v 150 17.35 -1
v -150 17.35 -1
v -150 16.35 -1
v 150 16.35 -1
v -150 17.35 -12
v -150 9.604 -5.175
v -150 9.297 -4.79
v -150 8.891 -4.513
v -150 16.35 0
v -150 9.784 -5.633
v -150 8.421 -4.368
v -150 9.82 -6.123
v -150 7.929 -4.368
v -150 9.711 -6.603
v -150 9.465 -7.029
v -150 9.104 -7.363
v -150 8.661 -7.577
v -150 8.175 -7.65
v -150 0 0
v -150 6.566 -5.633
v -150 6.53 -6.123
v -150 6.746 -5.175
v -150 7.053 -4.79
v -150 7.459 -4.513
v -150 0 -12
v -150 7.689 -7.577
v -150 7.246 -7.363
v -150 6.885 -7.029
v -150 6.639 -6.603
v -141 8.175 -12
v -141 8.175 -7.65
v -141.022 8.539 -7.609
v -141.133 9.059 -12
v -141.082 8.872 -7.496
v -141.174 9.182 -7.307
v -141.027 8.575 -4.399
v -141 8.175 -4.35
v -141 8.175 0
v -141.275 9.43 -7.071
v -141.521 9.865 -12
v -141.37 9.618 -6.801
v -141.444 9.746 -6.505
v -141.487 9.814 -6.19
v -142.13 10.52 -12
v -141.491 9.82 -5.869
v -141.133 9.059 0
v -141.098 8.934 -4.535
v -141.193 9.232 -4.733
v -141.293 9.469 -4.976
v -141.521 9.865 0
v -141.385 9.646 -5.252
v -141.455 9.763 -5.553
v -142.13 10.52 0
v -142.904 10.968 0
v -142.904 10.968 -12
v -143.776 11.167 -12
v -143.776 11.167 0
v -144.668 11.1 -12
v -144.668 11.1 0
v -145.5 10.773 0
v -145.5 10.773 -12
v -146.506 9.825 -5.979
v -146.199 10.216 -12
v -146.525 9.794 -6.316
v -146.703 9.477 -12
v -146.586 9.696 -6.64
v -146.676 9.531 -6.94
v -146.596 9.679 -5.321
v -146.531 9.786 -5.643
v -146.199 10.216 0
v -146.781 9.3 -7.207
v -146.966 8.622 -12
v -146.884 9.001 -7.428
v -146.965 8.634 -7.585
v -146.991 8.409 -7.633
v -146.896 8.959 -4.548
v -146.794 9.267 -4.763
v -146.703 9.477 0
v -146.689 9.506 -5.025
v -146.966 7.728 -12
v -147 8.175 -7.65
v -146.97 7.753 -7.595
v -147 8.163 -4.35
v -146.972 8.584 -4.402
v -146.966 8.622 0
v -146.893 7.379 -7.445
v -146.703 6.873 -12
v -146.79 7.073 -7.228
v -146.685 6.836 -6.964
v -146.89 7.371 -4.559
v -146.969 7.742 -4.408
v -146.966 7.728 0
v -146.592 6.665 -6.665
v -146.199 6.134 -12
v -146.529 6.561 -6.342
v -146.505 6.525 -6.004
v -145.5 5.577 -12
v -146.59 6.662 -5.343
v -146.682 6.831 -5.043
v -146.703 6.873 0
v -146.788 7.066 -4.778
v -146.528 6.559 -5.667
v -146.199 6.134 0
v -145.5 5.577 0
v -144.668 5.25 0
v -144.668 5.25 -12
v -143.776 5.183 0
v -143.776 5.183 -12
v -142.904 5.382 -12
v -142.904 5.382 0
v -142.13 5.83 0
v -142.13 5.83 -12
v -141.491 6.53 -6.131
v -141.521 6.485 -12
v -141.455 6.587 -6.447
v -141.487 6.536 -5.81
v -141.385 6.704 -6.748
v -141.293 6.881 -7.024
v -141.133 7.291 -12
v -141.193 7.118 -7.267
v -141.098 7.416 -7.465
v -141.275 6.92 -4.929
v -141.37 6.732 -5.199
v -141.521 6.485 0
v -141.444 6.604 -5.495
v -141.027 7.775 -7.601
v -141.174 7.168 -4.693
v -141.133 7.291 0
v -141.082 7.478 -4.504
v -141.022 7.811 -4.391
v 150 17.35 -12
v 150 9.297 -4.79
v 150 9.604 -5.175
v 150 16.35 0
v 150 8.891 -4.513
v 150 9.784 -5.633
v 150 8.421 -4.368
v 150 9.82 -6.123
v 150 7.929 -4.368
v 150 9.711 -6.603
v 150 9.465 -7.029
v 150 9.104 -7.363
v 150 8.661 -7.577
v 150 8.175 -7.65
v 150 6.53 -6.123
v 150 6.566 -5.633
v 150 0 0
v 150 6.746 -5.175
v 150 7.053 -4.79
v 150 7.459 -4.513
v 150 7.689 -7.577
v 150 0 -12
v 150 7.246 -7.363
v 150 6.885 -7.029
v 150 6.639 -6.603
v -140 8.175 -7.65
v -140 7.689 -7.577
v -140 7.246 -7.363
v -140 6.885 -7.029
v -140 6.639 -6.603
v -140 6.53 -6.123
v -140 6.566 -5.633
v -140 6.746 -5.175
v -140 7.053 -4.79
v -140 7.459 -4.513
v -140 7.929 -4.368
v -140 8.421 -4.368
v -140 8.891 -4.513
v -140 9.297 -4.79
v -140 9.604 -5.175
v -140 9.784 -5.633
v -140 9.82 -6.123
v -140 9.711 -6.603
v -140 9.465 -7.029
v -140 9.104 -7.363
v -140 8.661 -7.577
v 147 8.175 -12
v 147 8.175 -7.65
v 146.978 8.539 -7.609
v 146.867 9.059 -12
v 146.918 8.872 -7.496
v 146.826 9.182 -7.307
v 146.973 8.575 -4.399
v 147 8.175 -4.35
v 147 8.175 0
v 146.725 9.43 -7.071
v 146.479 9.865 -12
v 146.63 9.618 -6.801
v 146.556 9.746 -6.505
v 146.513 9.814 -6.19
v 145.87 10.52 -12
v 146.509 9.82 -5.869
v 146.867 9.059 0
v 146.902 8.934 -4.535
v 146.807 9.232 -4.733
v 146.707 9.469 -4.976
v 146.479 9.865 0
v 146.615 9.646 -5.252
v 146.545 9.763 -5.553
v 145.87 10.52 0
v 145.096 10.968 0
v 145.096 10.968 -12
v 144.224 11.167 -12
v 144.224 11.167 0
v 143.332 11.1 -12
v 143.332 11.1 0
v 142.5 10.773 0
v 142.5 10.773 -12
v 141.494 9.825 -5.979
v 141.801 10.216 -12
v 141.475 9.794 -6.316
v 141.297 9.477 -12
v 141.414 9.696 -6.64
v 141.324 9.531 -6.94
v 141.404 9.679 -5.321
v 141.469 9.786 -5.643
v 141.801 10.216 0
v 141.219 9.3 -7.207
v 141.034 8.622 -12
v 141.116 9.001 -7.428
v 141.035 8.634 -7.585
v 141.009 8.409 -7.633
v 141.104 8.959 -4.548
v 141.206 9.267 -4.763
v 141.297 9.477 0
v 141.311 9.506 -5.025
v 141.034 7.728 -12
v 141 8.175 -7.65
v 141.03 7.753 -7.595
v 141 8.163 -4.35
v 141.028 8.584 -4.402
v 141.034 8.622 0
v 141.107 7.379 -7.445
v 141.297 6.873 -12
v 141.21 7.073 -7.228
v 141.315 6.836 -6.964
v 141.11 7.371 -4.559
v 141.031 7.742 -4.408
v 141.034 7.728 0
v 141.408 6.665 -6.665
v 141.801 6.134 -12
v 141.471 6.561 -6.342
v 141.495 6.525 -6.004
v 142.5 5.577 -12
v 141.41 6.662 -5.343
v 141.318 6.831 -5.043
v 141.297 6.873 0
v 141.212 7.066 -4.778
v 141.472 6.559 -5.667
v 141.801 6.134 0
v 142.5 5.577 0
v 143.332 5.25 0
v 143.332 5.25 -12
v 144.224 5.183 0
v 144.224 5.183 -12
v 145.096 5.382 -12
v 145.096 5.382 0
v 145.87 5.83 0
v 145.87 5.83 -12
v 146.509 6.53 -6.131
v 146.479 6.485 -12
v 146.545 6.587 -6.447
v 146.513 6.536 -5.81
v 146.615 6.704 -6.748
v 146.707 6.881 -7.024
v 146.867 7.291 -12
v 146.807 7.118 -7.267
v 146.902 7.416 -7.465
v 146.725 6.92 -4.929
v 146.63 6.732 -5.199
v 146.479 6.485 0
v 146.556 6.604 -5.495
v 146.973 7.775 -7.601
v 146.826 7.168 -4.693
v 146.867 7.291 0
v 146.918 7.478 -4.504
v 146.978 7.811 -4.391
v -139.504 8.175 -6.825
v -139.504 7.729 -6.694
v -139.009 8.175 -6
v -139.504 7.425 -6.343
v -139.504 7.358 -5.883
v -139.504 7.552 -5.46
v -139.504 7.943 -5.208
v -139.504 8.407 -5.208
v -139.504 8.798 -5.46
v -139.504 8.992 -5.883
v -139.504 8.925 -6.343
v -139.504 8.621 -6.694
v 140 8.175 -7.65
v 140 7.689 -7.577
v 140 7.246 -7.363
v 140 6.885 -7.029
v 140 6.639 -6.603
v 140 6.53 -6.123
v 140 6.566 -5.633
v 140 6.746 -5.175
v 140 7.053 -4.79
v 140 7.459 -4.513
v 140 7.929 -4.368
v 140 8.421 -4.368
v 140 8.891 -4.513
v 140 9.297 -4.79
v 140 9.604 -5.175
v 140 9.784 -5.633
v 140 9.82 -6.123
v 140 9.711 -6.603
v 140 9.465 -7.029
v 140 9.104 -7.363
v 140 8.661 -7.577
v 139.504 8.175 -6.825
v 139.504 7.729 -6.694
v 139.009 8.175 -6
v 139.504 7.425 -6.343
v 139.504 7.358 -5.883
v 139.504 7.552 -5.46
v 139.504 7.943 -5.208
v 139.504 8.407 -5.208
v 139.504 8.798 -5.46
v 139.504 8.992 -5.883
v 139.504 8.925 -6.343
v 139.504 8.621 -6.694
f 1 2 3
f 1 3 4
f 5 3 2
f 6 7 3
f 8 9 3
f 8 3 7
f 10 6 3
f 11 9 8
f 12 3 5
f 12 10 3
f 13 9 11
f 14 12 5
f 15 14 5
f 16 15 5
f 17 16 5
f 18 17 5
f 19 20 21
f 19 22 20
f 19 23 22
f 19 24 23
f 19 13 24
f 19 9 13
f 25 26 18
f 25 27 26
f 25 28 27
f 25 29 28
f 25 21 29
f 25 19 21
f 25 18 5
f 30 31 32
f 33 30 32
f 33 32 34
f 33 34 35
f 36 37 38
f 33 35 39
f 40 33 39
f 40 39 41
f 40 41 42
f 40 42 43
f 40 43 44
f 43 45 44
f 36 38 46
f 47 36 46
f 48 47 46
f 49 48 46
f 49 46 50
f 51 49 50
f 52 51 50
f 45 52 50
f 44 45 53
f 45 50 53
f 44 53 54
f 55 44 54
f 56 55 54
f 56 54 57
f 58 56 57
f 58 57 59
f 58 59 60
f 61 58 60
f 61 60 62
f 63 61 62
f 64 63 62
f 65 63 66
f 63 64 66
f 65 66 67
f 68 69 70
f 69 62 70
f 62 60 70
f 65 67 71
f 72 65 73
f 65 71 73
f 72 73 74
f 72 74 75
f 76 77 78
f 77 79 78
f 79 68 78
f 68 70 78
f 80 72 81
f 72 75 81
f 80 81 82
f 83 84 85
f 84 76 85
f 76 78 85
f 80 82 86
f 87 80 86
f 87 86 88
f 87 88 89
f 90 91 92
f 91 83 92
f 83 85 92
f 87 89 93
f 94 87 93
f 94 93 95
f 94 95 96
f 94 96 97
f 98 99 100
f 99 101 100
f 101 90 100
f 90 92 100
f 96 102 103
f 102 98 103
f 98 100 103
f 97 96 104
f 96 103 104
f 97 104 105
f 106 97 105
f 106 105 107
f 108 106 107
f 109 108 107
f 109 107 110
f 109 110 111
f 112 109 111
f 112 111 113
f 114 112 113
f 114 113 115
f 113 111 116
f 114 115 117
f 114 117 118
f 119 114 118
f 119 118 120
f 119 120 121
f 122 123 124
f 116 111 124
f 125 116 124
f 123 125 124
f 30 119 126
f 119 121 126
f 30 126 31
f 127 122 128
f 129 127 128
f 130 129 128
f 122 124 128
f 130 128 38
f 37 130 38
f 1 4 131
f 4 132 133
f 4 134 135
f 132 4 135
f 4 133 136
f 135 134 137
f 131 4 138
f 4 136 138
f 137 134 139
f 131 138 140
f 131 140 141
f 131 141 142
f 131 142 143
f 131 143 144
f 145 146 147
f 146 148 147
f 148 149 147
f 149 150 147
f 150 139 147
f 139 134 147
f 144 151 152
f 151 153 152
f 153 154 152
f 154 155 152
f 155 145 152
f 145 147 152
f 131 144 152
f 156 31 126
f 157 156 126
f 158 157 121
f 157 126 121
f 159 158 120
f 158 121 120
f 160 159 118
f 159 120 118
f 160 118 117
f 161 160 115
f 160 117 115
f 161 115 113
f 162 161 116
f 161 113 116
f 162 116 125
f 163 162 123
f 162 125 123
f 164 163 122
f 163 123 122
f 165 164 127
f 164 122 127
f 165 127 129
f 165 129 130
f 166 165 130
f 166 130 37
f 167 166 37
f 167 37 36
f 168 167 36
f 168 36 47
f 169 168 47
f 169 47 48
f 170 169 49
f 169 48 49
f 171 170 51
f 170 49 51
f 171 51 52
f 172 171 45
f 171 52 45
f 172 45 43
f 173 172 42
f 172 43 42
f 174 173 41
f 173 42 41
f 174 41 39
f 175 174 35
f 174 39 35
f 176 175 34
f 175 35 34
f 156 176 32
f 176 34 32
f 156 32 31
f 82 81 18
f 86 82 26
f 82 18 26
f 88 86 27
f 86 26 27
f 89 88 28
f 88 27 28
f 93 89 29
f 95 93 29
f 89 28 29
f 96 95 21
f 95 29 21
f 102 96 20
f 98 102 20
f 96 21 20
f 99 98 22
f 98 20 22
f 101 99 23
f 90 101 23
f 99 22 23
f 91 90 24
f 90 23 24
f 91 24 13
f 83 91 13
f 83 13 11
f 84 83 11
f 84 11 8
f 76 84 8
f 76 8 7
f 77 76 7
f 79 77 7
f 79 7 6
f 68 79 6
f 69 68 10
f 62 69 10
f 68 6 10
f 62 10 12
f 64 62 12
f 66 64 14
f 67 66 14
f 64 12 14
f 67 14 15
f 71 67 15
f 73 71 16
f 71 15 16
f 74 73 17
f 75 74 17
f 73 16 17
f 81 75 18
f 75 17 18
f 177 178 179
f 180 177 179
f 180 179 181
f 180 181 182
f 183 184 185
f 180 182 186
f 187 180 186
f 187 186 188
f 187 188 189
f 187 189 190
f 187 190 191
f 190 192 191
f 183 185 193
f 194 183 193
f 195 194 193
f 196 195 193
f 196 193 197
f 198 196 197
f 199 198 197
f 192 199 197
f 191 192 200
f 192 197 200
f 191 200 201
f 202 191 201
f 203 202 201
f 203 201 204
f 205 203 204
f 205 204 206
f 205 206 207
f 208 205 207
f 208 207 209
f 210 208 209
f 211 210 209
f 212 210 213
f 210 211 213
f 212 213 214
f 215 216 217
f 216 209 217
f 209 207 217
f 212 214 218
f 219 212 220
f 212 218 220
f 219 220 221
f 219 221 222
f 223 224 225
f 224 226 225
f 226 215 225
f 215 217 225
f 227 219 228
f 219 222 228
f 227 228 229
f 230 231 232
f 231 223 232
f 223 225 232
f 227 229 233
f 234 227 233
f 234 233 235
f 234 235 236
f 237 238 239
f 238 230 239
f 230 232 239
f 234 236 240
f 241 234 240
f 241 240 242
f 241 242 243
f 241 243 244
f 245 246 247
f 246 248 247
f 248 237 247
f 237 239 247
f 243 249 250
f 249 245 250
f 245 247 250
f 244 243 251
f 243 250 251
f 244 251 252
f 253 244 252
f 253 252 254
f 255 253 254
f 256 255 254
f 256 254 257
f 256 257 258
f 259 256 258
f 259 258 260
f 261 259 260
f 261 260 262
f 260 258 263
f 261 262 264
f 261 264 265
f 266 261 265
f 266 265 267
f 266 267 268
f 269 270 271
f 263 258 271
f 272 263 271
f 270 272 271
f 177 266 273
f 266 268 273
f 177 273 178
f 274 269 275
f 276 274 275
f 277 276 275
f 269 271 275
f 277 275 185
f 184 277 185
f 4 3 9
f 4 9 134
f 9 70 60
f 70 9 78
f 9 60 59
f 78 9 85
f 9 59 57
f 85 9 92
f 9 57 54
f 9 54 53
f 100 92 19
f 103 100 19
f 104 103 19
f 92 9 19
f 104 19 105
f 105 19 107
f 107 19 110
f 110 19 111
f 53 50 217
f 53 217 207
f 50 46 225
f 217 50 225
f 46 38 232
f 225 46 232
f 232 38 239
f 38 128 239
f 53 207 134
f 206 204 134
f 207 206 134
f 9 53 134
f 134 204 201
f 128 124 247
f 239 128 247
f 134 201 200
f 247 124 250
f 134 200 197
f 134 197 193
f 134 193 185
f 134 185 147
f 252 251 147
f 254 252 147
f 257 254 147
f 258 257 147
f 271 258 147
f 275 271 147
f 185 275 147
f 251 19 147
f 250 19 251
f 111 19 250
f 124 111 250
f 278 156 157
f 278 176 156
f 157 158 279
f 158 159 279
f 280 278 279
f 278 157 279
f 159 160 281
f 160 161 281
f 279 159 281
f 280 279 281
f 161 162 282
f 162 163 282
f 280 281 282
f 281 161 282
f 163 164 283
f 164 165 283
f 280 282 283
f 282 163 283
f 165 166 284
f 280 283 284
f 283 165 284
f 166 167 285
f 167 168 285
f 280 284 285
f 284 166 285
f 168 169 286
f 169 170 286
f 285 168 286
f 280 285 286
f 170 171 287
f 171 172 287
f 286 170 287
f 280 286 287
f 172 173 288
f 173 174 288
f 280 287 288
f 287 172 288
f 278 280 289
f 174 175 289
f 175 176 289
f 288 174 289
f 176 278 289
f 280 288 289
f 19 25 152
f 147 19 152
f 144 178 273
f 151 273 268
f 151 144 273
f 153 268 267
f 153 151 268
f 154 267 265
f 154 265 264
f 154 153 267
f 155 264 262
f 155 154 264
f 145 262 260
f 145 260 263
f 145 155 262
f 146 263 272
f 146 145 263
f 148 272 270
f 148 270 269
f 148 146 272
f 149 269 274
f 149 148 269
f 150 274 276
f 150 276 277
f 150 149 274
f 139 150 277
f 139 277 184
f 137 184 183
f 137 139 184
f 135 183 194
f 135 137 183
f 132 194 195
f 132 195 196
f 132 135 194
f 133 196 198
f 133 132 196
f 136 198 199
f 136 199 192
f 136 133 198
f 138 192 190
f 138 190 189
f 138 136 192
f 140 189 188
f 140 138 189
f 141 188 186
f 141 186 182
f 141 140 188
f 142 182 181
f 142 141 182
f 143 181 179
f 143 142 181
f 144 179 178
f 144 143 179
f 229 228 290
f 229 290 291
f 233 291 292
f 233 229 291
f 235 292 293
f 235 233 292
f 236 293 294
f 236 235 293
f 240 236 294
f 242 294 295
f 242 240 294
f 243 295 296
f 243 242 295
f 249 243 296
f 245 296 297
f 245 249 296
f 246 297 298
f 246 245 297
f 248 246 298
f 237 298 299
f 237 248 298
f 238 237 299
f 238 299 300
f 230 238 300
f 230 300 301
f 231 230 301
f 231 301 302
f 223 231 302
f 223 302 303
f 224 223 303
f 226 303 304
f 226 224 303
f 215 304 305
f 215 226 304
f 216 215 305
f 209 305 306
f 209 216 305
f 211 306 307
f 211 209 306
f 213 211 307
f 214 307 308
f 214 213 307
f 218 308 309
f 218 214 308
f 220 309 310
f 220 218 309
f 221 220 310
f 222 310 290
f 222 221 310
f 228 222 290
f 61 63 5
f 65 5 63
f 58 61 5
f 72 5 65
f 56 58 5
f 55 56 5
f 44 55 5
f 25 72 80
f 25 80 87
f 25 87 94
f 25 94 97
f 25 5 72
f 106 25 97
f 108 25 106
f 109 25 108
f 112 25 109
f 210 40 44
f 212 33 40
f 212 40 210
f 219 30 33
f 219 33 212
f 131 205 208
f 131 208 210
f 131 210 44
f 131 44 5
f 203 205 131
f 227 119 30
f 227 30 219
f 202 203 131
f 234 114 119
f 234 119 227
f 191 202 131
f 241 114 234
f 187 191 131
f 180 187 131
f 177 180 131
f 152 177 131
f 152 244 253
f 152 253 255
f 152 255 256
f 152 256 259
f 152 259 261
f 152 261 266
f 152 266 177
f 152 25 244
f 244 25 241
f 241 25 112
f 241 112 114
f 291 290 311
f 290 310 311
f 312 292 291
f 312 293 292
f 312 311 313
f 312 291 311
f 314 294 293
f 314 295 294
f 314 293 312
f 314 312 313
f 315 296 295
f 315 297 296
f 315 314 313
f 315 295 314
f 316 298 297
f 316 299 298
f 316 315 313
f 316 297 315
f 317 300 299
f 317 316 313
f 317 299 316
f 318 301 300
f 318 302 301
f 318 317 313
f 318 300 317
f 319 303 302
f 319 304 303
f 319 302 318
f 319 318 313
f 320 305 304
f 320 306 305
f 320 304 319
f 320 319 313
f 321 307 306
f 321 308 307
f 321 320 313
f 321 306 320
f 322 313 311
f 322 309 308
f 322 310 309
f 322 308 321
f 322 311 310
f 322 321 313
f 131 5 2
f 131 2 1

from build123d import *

# Parameters (mm, degrees)
SKETCH_1_W          = 300
SKETCH_1_H          = 12
EXTRUDE_320_DEPTH   = 17.35
SKETCH_2_W          = 300
SKETCH_2_H          = 1
CUT_EXTRUDE_1_DEPTH = 1
SKETCH_5_R          = 3
CUT_EXTRUDE_6_DEPTH = 152.476144987


with BuildPart() as part:
    # Эскиз1 → Extrude 320 (new body)
    with BuildSketch(Plane(origin=(0, 0, 0), x_dir=(1, 0, 0), z_dir=(0, 1, 0))):
        with Locations((0, 6)):
            Rectangle(SKETCH_1_W, SKETCH_1_H)
    extrude(amount=EXTRUDE_320_DEPTH)

    # Эскиз2 → Вырез-Вытянуть1 (cut)
    with BuildSketch(Plane(origin=(0, 17.35, 0), x_dir=(1, 0, 0), z_dir=(0, 1, 0))):
        with Locations((0, 0.5)):
            Rectangle(SKETCH_2_W, SKETCH_2_H)
    extrude(amount=-CUT_EXTRUDE_1_DEPTH, mode=Mode.SUBTRACT)

    # Эскиз5 → Валы-6мм (cut, through all)
    with BuildSketch(Plane.XY):
        with Locations((-144, 8.175)):
            Circle(SKETCH_5_R)
        with Locations((144, 8.175)):
            Circle(SKETCH_5_R)
    extrude(amount=-CUT_EXTRUDE_6_DEPTH, mode=Mode.SUBTRACT)

    # Эскиз10 → Фиксация-M4 (revolve, cut)
    with BuildSketch(Plane(origin=(150, 8.175, -6), x_dir=(0, 0, -1), z_dir=(0, 1, 0))):
        Polygon((0, 0), (0, 10.991420021), (1.65, 10), (1.65, 0), align=None)
    hole_wizard_m4 = revolve(axis=Axis((156.35, 8.175, -6), (-1, 0, 0)), mode=Mode.SUBTRACT)

    # Зеркальное отражение1: Фиксация-M4 across plane
    add(hole_wizard_m4.mirror(Plane(origin=(0, 0, 0), x_dir=(0, 0, 1), z_dir=(1, 0, 0))), mode=Mode.SUBTRACT)


solid = part.part
